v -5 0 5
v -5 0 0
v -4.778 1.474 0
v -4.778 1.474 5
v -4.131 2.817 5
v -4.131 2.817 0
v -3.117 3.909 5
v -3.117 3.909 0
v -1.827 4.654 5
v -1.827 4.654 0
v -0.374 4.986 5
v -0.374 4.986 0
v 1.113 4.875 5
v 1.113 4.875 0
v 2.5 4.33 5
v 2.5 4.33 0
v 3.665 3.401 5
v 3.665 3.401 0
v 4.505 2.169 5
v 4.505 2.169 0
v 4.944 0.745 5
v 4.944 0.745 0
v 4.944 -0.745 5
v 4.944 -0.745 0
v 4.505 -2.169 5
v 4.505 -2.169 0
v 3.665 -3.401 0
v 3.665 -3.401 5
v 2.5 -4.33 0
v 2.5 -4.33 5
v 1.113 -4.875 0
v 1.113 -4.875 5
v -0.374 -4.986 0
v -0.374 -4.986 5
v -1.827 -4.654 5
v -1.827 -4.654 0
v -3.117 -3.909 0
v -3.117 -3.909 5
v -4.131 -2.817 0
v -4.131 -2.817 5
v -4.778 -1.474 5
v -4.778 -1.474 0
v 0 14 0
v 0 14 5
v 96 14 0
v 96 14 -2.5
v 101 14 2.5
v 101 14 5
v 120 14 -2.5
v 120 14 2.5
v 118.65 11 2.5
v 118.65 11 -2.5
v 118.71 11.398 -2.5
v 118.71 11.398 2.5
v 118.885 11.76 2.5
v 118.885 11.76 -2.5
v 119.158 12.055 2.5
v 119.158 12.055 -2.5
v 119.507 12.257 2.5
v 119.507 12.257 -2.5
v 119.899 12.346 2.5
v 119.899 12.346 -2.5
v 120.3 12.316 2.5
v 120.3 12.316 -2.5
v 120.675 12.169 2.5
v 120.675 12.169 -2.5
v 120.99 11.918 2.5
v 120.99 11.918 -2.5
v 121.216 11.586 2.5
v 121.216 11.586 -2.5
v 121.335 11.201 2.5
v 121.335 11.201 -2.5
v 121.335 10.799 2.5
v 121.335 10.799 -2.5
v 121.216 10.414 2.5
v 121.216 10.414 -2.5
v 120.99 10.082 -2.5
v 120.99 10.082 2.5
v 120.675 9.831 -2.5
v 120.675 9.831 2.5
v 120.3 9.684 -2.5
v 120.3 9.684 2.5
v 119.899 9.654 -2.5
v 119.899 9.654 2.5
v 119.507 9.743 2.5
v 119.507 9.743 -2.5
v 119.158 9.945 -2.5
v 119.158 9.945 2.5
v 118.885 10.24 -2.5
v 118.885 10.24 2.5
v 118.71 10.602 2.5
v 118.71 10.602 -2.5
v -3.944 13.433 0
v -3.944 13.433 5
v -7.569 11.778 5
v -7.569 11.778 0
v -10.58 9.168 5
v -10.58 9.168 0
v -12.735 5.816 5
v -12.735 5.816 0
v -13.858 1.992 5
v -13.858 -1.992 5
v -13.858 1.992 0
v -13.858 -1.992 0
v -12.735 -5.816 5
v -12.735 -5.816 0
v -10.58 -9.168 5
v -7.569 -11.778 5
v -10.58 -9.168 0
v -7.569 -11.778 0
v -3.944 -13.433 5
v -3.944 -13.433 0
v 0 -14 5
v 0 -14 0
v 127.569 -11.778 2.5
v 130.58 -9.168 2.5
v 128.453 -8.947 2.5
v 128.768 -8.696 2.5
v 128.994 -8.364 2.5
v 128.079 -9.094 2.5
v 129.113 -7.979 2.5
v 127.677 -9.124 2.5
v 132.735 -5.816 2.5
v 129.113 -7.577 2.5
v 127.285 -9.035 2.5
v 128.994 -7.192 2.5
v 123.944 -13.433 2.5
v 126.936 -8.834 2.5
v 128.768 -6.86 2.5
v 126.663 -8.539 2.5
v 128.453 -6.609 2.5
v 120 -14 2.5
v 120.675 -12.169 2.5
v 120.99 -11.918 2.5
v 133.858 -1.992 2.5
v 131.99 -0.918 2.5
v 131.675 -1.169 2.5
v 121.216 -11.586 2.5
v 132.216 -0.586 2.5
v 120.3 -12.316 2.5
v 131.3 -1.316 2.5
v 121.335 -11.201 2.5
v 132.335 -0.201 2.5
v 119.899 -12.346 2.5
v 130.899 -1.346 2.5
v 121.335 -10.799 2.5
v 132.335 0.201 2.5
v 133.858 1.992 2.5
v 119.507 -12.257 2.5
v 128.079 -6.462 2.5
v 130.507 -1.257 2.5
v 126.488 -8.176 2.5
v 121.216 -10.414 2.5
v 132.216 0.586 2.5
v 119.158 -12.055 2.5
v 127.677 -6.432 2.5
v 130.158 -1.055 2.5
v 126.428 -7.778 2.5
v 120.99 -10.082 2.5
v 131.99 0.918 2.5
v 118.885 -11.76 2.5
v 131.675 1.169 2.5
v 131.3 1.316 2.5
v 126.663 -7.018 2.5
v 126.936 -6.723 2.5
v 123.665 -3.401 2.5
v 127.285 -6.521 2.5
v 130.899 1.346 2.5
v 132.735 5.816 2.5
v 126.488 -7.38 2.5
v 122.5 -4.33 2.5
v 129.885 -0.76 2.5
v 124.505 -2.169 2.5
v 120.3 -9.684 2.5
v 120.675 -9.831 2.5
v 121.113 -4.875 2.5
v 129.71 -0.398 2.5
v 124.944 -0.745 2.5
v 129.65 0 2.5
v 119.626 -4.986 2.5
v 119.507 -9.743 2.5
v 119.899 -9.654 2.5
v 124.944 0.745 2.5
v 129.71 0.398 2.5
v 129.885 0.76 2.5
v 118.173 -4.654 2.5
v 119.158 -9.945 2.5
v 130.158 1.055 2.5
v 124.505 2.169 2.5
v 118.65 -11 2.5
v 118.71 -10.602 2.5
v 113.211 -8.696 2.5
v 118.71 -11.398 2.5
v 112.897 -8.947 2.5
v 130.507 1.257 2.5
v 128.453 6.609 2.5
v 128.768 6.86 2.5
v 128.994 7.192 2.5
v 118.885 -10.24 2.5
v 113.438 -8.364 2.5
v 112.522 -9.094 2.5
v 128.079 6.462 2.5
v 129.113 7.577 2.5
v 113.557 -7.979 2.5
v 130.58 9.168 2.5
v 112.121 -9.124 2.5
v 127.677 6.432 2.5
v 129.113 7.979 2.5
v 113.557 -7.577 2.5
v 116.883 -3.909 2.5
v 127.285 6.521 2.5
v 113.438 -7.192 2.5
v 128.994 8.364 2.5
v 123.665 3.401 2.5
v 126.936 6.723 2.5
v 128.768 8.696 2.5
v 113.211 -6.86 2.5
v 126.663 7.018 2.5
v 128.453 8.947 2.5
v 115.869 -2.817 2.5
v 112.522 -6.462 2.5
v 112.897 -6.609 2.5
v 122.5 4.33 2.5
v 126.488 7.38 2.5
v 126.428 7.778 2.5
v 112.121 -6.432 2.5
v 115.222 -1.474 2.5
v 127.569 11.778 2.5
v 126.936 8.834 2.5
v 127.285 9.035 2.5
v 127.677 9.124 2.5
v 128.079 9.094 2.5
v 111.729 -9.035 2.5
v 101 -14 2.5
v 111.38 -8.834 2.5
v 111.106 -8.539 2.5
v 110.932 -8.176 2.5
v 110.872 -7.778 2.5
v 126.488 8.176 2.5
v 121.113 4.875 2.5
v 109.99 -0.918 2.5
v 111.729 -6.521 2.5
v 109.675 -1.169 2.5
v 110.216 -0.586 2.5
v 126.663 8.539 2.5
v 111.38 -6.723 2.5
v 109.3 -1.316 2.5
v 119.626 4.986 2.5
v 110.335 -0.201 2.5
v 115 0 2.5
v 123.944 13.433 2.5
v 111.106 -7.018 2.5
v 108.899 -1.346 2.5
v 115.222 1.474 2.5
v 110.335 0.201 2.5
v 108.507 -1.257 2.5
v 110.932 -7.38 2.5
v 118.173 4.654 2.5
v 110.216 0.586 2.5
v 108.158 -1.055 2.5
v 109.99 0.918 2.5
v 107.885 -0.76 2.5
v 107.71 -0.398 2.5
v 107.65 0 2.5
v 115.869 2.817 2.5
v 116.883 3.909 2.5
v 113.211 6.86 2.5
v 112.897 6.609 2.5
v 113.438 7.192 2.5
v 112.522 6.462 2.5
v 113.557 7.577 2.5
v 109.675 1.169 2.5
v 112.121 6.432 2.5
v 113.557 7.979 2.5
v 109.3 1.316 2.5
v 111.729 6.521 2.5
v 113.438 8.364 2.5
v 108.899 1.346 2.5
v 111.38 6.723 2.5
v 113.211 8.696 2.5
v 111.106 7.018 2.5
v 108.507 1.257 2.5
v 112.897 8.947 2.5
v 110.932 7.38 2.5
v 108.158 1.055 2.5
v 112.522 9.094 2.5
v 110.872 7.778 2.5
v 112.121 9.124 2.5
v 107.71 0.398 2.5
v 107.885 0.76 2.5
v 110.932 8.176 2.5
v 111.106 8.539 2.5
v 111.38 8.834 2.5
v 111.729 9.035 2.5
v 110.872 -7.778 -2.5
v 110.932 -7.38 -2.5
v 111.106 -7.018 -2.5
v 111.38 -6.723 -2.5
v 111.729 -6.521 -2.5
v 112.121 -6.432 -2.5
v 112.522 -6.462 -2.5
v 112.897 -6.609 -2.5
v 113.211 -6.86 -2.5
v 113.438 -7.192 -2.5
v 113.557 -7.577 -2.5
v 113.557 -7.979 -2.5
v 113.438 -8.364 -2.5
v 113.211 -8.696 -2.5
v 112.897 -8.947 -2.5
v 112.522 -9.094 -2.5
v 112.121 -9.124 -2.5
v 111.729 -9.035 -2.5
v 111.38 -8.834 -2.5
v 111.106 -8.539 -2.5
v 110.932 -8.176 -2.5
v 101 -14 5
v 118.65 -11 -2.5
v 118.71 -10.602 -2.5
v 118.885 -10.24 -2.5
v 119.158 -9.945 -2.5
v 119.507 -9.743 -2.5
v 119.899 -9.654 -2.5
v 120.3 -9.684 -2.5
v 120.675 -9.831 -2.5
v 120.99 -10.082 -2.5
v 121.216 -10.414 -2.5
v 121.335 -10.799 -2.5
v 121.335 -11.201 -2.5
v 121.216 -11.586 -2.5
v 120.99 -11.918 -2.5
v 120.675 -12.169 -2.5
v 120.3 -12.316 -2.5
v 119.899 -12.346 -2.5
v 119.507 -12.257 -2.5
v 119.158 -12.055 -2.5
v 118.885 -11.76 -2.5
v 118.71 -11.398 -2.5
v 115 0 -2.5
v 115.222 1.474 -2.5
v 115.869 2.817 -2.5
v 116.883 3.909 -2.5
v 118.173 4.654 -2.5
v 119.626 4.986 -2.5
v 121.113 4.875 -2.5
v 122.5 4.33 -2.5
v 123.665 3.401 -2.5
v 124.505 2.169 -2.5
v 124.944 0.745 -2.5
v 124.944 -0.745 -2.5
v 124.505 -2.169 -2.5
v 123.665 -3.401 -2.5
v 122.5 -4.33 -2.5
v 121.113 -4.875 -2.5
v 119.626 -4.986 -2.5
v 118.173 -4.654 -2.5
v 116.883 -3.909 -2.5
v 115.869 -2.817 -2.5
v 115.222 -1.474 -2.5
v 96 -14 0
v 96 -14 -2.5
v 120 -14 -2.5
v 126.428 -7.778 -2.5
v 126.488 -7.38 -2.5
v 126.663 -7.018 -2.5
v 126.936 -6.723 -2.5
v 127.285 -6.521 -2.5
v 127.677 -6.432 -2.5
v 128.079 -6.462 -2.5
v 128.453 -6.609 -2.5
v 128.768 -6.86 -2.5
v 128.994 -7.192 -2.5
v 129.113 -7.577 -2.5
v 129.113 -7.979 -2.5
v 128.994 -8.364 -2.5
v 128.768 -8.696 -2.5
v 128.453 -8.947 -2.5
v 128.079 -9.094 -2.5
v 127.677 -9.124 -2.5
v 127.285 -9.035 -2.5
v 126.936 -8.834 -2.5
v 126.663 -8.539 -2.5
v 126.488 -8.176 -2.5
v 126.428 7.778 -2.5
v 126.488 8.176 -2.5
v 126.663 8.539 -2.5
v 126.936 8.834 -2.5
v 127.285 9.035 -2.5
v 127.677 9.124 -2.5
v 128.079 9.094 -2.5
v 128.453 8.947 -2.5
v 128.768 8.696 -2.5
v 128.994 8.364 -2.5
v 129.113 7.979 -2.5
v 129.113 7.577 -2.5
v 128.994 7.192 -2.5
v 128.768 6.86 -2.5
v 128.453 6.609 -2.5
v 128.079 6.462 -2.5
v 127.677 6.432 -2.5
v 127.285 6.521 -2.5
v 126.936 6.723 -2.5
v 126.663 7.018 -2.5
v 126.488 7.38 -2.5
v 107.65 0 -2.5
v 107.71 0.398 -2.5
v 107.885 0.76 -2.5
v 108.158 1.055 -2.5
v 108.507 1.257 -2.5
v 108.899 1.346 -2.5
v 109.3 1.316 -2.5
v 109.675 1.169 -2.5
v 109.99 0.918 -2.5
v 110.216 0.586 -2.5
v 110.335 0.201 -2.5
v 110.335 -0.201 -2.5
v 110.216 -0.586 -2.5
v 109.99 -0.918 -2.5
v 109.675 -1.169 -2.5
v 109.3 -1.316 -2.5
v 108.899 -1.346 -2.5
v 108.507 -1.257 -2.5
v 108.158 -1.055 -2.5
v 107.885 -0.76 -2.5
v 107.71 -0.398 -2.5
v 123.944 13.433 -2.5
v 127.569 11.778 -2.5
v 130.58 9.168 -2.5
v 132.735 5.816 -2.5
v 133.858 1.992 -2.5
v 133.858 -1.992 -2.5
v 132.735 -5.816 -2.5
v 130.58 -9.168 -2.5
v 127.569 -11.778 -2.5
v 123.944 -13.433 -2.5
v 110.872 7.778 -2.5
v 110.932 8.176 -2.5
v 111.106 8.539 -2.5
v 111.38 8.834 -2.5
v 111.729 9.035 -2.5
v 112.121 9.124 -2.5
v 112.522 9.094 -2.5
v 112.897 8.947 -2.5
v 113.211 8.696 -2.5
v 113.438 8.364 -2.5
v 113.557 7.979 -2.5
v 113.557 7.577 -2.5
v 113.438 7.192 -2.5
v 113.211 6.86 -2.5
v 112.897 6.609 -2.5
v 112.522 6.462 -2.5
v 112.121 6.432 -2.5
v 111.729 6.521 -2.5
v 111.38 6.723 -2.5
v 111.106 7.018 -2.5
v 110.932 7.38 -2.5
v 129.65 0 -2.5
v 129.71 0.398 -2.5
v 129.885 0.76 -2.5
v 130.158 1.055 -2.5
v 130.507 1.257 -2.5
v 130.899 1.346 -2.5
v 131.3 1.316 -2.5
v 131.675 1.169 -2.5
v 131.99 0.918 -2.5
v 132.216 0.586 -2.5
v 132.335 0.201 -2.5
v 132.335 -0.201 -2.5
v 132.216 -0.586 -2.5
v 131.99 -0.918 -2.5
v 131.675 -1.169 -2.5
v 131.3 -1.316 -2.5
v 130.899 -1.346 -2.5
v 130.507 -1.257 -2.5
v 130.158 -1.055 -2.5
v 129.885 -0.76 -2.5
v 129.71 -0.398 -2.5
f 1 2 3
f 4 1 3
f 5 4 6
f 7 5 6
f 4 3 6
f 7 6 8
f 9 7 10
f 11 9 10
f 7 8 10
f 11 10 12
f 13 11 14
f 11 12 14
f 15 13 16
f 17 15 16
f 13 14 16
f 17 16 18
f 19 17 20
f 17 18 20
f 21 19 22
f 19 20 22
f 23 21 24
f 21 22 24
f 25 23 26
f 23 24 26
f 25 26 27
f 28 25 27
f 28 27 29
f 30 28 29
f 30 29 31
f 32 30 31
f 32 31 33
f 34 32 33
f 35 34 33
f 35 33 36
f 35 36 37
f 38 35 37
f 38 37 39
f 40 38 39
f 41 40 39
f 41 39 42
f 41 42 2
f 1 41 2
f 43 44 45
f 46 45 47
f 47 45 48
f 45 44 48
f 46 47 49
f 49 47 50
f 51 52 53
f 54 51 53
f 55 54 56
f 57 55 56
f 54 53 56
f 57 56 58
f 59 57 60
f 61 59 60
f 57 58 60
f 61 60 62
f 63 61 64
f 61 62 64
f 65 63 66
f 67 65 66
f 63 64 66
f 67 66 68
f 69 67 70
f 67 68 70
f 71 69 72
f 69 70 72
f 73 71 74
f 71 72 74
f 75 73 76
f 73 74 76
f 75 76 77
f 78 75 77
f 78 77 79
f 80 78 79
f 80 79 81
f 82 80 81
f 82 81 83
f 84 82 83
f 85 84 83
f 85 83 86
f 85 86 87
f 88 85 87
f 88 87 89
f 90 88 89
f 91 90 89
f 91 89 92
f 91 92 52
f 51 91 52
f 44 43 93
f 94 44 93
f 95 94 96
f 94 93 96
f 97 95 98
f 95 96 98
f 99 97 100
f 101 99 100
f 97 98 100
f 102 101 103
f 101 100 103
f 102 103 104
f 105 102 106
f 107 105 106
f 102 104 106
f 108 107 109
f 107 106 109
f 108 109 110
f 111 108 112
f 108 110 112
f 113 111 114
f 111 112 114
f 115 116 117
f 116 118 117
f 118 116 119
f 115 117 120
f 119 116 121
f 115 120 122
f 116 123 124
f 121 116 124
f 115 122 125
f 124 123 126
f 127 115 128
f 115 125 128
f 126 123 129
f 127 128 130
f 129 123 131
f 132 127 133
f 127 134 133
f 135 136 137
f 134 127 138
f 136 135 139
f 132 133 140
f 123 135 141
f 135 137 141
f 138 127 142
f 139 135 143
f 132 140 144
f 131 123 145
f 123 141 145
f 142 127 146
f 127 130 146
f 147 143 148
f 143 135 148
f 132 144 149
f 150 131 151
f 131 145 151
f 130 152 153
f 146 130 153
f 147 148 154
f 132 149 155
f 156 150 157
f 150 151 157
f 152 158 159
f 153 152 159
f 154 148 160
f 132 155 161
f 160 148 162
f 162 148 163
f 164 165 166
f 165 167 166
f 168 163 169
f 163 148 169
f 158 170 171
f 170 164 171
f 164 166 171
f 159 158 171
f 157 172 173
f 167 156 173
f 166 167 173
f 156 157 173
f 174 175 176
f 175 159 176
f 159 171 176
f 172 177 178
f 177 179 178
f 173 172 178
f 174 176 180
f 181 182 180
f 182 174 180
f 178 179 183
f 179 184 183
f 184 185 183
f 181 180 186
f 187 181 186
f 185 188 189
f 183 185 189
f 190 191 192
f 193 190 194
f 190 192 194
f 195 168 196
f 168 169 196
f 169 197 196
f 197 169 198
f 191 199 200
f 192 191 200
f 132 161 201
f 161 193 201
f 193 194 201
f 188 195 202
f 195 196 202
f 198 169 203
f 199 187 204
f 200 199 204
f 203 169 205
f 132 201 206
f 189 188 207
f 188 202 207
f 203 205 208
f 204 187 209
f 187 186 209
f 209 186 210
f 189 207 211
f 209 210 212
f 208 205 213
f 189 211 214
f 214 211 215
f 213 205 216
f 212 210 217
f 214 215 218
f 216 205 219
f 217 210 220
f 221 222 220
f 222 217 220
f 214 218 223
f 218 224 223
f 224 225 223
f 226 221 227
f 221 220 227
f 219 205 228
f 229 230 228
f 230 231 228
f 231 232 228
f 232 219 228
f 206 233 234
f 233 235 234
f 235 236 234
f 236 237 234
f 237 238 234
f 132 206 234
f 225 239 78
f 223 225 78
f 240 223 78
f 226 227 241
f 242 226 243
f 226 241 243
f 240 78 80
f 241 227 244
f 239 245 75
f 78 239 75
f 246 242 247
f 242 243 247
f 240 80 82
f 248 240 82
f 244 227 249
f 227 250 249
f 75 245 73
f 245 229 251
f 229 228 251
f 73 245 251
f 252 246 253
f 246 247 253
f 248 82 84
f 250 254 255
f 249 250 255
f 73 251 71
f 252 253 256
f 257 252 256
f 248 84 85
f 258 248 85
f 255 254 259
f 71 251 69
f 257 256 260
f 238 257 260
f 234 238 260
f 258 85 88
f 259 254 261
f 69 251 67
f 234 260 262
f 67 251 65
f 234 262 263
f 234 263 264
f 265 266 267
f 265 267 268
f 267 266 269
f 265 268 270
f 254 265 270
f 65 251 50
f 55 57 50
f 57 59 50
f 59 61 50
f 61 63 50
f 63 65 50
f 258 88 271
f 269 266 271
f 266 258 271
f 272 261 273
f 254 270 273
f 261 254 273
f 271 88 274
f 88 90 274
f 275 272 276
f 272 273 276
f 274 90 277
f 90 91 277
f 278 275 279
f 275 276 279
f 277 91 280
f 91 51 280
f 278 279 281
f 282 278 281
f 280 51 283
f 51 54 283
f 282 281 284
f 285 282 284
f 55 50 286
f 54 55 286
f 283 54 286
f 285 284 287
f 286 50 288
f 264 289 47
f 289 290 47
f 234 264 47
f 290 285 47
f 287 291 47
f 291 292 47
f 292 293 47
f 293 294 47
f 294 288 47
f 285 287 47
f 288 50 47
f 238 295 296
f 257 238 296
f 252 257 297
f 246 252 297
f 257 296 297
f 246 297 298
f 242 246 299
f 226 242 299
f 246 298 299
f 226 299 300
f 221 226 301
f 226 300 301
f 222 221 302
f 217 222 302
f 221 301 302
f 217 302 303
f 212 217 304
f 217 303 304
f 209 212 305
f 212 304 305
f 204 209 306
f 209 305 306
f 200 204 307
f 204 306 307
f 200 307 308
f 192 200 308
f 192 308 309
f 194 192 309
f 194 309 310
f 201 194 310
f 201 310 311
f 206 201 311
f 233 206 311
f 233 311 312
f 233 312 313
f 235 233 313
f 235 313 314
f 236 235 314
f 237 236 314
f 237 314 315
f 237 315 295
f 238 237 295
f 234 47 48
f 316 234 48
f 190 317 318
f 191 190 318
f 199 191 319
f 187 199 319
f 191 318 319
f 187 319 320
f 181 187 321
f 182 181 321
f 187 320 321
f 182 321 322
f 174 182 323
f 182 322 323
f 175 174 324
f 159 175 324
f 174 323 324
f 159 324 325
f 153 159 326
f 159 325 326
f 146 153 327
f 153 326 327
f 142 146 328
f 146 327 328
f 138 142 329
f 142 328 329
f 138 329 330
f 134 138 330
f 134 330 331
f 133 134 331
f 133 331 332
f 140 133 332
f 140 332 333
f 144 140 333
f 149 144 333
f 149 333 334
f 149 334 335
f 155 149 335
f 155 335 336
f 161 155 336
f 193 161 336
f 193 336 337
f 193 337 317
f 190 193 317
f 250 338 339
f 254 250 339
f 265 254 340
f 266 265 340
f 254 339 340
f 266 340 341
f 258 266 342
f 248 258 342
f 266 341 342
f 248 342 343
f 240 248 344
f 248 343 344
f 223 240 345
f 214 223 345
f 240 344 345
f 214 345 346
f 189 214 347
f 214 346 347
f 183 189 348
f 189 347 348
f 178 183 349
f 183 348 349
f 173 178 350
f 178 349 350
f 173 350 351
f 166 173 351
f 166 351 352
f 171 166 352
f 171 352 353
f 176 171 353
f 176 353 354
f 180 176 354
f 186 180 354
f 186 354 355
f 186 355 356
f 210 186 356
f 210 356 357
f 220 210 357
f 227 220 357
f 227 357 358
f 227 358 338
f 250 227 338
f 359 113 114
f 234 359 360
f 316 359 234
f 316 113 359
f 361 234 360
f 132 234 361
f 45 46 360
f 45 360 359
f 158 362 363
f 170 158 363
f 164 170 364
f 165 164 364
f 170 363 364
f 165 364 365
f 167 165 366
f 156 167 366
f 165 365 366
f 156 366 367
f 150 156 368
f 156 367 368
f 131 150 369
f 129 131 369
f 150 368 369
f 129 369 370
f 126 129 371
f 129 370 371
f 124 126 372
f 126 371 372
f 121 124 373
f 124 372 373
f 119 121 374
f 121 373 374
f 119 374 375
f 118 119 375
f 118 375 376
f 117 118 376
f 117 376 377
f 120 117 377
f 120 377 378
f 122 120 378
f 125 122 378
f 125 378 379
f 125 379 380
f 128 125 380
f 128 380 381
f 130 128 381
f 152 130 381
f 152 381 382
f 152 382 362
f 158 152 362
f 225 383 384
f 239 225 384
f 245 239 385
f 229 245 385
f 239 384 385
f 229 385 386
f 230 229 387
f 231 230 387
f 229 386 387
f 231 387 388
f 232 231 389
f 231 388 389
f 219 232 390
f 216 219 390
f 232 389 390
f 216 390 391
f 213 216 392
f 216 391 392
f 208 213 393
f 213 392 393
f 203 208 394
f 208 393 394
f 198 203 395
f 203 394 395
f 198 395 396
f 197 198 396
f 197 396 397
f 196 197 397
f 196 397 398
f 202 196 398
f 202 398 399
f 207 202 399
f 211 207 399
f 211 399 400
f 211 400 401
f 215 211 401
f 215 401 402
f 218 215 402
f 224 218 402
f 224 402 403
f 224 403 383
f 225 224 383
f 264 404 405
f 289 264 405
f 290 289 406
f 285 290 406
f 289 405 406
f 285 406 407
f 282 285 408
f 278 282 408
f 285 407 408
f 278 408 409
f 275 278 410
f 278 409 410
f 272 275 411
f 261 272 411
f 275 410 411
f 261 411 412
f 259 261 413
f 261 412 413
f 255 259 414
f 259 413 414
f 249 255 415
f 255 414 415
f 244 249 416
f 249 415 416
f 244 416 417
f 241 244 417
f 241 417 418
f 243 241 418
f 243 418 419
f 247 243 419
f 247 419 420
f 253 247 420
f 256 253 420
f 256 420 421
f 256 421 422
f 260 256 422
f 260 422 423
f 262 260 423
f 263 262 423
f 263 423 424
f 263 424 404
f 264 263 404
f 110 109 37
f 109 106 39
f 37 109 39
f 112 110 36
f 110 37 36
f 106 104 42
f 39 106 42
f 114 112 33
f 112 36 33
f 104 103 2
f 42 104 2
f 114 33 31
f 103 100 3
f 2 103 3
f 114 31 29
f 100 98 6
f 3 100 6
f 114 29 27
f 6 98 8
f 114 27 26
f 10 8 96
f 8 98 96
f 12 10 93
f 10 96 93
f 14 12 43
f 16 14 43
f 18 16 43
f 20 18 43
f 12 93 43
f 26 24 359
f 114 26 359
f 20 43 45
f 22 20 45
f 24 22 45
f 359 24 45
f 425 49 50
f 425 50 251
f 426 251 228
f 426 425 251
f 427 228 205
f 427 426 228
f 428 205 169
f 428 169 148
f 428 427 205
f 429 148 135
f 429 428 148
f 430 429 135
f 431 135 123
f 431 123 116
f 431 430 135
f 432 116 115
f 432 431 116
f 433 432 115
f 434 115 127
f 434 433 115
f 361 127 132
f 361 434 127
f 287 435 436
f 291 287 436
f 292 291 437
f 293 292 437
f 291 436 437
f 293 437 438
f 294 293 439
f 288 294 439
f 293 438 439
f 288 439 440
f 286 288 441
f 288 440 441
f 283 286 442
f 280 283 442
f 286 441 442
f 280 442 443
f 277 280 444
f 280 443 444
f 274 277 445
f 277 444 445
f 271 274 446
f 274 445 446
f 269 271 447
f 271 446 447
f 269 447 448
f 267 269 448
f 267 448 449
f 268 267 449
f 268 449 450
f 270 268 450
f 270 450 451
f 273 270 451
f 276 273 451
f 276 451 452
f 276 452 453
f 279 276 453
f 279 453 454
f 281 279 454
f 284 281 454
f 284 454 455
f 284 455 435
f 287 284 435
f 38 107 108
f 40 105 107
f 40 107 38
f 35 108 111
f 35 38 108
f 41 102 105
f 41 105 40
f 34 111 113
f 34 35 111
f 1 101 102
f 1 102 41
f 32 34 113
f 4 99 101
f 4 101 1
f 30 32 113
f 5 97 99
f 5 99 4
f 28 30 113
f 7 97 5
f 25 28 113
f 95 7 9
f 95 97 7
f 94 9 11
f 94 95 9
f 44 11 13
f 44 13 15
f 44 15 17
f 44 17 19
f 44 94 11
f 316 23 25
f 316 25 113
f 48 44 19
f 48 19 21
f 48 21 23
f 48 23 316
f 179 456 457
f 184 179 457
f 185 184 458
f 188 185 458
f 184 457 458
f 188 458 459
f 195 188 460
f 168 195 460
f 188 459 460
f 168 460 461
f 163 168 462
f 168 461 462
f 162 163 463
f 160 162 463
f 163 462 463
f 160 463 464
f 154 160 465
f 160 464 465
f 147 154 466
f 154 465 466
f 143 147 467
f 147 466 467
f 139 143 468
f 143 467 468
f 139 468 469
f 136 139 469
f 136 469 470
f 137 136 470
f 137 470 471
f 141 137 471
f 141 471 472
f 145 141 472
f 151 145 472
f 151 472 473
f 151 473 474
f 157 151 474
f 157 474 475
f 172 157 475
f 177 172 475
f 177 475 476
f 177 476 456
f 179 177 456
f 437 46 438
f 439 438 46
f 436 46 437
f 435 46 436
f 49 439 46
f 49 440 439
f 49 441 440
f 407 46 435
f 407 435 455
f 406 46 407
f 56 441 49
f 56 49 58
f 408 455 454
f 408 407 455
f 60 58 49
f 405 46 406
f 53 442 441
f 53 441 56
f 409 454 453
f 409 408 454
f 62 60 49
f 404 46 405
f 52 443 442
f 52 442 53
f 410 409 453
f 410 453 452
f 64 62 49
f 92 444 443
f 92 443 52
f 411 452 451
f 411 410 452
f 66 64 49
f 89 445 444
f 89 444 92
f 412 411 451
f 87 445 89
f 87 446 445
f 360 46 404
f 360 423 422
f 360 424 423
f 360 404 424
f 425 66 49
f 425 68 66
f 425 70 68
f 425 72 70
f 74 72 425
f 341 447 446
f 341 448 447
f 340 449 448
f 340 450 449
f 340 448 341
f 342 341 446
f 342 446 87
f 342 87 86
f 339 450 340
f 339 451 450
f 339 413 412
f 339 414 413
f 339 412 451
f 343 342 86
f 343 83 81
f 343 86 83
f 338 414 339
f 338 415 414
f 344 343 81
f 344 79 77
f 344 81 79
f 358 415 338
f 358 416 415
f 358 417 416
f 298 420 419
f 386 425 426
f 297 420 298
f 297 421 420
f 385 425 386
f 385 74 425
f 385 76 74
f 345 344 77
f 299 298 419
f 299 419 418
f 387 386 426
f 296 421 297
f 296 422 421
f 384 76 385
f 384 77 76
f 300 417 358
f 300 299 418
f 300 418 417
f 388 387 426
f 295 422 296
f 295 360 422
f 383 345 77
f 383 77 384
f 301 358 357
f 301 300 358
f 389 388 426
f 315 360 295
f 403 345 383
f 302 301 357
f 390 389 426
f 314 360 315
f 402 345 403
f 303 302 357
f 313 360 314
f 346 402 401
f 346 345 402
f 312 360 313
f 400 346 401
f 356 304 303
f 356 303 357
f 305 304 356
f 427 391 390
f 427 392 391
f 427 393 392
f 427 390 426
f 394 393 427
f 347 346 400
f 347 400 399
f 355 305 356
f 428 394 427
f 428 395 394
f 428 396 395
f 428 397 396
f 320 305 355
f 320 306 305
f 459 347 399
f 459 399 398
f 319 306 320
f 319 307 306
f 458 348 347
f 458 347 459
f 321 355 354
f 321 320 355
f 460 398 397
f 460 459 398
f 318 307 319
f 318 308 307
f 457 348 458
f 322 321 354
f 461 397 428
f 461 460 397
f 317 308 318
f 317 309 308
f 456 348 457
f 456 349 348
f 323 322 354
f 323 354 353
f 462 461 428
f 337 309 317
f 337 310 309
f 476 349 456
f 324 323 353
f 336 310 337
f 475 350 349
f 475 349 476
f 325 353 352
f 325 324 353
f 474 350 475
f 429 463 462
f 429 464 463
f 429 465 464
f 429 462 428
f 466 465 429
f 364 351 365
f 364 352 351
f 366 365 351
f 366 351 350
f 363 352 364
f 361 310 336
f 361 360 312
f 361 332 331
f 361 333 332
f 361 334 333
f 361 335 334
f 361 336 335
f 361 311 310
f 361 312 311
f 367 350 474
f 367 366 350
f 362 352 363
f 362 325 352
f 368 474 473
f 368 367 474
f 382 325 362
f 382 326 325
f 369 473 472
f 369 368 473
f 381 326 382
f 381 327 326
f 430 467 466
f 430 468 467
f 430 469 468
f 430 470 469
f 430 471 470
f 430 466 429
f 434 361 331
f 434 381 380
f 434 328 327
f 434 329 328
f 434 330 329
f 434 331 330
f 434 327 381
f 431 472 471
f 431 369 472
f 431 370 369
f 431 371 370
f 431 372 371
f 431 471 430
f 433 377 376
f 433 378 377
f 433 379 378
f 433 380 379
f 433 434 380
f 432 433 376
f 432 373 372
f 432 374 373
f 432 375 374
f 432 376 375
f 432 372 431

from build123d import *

# Parameters (mm, degrees)
RESSALTO_EXTRUS_O1_DEPTH = 5
ESBO_O2_R                = 1.35
ESBO_O2_R_2              = 1.373066436
ESBO_O2_R_3              = 1.330065432
ESBO_O2_R_4              = 5
CORTE_EXTRUS_O1_DEPTH    = 137.810087347
ESBO_O3_R                = 5
CORTE_EXTRUS_O2_DEPTH    = 137.810087347
ESBO_O5_W                = 31.24115408
ESBO_O5_H                = 28
CORTE_EXTRUS_O3_DEPTH    = 137.810087347
ESBO_O6_W                = 5
ESBO_O6_H                = 28
RESSALTO_EXTRUS_O2_DEPTH = 2.5
RESSALTO_EXTRUS_O4_DEPTH = 5
ESBO_O8_R                = 5
ESBO_O8_R_2              = 1.35
CORTE_EXTRUS_O4_DEPTH    = 135.937948702
ESBO_O10_W               = 5
ESBO_O10_H               = 2.5
CORTE_EXTRUS_O5_DEPTH    = 137.985400682
ESBO_O11_W               = 5
ESBO_O11_H               = 2.5
RESSALTO_EXTRUS_O5_DEPTH = 28


with BuildPart() as part:
    # Esboço1 → Ressalto-extrusão1 (new body)
    with BuildSketch(Plane.XY):
        with BuildLine():
            Line((0, -14), (122, -14))
            ThreePointArc((122, -14), (136, 0), (122, 14))
            Line((122, 14), (0, 14))
            ThreePointArc((0, 14), (-14, 0), (0, -14))
        make_face()
    extrude(amount=RESSALTO_EXTRUS_O1_DEPTH)

    # Esboço2 → Corte-extrusão1 (cut, through all)
    with BuildSketch(Plane(origin=(0, 0, 0), x_dir=(-1, 0, 0), z_dir=(0, 0, -1))):
        with Locations((-125.327123404, 10.484762747)):
            Circle(ESBO_O2_R)
        with Locations((-116.938784683, 9.766478358)):
            Circle(ESBO_O2_R)
        with Locations((-111.515237253, 3.327123404)):
            Circle(ESBO_O2_R)
        with Locations((-112.233521642, -5.061215317)):
            Circle(ESBO_O2_R)
        with Locations((-118.672876596, -10.484762747)):
            Circle(ESBO_O2_R_2)
        with Locations((-127.061215317, -9.766478358)):
            Circle(ESBO_O2_R_3)
        with Locations((-132.484762747, -3.327123404)):
            Circle(ESBO_O2_R)
        with Locations((-131.766478358, 5.061215317)):
            Circle(ESBO_O2_R)
        with Locations((-122, 0)):
            Circle(ESBO_O2_R_4)
    extrude(amount=-CORTE_EXTRUS_O1_DEPTH, mode=Mode.SUBTRACT)

    # Esboço3 → Corte-extrusão2 (cut, through all)
    with BuildSketch(Plane(origin=(0, 0, 0), x_dir=(-1, 0, 0), z_dir=(0, 0, -1))):
        Circle(ESBO_O3_R)
    extrude(amount=-CORTE_EXTRUS_O2_DEPTH, mode=Mode.SUBTRACT)

    # Esboço5 → Corte-extrusão3 (cut, through all)
    with BuildSketch(Plane(origin=(0, 0, 0), x_dir=(-1, 0, 0), z_dir=(0, 0, -1))):
        with Locations((-121.62057704, 0)):
            Rectangle(ESBO_O5_W, ESBO_O5_H)
    extrude(amount=-CORTE_EXTRUS_O3_DEPTH, mode=Mode.SUBTRACT)

    # Esboço6 → Ressalto-extrusão2 (add)
    with BuildSketch(Plane(origin=(0, 0, 0), x_dir=(-1, 0, 0), z_dir=(0, 0, -1))):
        with Locations((-103.5, 0)):
            Rectangle(ESBO_O6_W, ESBO_O6_H)
    extrude(amount=RESSALTO_EXTRUS_O2_DEPTH)

    # Esboço7 → Ressalto-extrusão4 (add)
    with BuildSketch(Plane(origin=(0, 0, -2.5), x_dir=(-1, 0, 0), z_dir=(0, 0, -1))):
        with BuildLine():
            Line((-106, 14), (-120, 14))
            ThreePointArc((-120, 14), (-134, 0), (-120, -14))
            Line((-120, -14), (-106, -14))
            Line((-106, -14), (-106, 14))
        make_face()
    extrude(amount=-RESSALTO_EXTRUS_O4_DEPTH)

    # Esboço8 → Corte-extrusão4 (cut, through all)
    with BuildSketch(Plane(origin=(0, 0, -2.5), x_dir=(-1, 0, 0), z_dir=(0, 0, -1))):
        with Locations((-120, 0)):
            Circle(ESBO_O8_R)
        with Locations((-120, 11)):
            Circle(ESBO_O8_R_2)
        with Locations((-109, 0)):
            Circle(ESBO_O8_R_2)
        with Locations((-120, -11)):
            Circle(ESBO_O8_R_2)
        with Locations((-131, 0)):
            Circle(ESBO_O8_R_2)
        with Locations((-112.221825407, 7.778174593)):
            Circle(ESBO_O8_R_2)
        with Locations((-112.221825407, -7.778174593)):
            Circle(ESBO_O8_R_2)
        with Locations((-127.778174593, -7.778174593)):
            Circle(ESBO_O8_R_2)
        with Locations((-127.778174593, 7.778174593)):
            Circle(ESBO_O8_R_2)
    extrude(amount=-CORTE_EXTRUS_O4_DEPTH, mode=Mode.SUBTRACT)

    # Esboço10 → Corte-extrusão5 (cut, through all)
    with BuildSketch(Plane.XZ.offset(14)):
        with Locations((103.5, 3.75)):
            Rectangle(ESBO_O10_W, ESBO_O10_H)
    extrude(amount=-CORTE_EXTRUS_O5_DEPTH, mode=Mode.SUBTRACT)

    # Esboço11 → Ressalto-extrusão5 (add, through all)
    with BuildSketch(Plane.XZ.offset(14)):
        with Locations((98.5, -1.25)):
            Rectangle(ESBO_O11_W, ESBO_O11_H)
    extrude(amount=-RESSALTO_EXTRUS_O5_DEPTH)


solid = part.part
